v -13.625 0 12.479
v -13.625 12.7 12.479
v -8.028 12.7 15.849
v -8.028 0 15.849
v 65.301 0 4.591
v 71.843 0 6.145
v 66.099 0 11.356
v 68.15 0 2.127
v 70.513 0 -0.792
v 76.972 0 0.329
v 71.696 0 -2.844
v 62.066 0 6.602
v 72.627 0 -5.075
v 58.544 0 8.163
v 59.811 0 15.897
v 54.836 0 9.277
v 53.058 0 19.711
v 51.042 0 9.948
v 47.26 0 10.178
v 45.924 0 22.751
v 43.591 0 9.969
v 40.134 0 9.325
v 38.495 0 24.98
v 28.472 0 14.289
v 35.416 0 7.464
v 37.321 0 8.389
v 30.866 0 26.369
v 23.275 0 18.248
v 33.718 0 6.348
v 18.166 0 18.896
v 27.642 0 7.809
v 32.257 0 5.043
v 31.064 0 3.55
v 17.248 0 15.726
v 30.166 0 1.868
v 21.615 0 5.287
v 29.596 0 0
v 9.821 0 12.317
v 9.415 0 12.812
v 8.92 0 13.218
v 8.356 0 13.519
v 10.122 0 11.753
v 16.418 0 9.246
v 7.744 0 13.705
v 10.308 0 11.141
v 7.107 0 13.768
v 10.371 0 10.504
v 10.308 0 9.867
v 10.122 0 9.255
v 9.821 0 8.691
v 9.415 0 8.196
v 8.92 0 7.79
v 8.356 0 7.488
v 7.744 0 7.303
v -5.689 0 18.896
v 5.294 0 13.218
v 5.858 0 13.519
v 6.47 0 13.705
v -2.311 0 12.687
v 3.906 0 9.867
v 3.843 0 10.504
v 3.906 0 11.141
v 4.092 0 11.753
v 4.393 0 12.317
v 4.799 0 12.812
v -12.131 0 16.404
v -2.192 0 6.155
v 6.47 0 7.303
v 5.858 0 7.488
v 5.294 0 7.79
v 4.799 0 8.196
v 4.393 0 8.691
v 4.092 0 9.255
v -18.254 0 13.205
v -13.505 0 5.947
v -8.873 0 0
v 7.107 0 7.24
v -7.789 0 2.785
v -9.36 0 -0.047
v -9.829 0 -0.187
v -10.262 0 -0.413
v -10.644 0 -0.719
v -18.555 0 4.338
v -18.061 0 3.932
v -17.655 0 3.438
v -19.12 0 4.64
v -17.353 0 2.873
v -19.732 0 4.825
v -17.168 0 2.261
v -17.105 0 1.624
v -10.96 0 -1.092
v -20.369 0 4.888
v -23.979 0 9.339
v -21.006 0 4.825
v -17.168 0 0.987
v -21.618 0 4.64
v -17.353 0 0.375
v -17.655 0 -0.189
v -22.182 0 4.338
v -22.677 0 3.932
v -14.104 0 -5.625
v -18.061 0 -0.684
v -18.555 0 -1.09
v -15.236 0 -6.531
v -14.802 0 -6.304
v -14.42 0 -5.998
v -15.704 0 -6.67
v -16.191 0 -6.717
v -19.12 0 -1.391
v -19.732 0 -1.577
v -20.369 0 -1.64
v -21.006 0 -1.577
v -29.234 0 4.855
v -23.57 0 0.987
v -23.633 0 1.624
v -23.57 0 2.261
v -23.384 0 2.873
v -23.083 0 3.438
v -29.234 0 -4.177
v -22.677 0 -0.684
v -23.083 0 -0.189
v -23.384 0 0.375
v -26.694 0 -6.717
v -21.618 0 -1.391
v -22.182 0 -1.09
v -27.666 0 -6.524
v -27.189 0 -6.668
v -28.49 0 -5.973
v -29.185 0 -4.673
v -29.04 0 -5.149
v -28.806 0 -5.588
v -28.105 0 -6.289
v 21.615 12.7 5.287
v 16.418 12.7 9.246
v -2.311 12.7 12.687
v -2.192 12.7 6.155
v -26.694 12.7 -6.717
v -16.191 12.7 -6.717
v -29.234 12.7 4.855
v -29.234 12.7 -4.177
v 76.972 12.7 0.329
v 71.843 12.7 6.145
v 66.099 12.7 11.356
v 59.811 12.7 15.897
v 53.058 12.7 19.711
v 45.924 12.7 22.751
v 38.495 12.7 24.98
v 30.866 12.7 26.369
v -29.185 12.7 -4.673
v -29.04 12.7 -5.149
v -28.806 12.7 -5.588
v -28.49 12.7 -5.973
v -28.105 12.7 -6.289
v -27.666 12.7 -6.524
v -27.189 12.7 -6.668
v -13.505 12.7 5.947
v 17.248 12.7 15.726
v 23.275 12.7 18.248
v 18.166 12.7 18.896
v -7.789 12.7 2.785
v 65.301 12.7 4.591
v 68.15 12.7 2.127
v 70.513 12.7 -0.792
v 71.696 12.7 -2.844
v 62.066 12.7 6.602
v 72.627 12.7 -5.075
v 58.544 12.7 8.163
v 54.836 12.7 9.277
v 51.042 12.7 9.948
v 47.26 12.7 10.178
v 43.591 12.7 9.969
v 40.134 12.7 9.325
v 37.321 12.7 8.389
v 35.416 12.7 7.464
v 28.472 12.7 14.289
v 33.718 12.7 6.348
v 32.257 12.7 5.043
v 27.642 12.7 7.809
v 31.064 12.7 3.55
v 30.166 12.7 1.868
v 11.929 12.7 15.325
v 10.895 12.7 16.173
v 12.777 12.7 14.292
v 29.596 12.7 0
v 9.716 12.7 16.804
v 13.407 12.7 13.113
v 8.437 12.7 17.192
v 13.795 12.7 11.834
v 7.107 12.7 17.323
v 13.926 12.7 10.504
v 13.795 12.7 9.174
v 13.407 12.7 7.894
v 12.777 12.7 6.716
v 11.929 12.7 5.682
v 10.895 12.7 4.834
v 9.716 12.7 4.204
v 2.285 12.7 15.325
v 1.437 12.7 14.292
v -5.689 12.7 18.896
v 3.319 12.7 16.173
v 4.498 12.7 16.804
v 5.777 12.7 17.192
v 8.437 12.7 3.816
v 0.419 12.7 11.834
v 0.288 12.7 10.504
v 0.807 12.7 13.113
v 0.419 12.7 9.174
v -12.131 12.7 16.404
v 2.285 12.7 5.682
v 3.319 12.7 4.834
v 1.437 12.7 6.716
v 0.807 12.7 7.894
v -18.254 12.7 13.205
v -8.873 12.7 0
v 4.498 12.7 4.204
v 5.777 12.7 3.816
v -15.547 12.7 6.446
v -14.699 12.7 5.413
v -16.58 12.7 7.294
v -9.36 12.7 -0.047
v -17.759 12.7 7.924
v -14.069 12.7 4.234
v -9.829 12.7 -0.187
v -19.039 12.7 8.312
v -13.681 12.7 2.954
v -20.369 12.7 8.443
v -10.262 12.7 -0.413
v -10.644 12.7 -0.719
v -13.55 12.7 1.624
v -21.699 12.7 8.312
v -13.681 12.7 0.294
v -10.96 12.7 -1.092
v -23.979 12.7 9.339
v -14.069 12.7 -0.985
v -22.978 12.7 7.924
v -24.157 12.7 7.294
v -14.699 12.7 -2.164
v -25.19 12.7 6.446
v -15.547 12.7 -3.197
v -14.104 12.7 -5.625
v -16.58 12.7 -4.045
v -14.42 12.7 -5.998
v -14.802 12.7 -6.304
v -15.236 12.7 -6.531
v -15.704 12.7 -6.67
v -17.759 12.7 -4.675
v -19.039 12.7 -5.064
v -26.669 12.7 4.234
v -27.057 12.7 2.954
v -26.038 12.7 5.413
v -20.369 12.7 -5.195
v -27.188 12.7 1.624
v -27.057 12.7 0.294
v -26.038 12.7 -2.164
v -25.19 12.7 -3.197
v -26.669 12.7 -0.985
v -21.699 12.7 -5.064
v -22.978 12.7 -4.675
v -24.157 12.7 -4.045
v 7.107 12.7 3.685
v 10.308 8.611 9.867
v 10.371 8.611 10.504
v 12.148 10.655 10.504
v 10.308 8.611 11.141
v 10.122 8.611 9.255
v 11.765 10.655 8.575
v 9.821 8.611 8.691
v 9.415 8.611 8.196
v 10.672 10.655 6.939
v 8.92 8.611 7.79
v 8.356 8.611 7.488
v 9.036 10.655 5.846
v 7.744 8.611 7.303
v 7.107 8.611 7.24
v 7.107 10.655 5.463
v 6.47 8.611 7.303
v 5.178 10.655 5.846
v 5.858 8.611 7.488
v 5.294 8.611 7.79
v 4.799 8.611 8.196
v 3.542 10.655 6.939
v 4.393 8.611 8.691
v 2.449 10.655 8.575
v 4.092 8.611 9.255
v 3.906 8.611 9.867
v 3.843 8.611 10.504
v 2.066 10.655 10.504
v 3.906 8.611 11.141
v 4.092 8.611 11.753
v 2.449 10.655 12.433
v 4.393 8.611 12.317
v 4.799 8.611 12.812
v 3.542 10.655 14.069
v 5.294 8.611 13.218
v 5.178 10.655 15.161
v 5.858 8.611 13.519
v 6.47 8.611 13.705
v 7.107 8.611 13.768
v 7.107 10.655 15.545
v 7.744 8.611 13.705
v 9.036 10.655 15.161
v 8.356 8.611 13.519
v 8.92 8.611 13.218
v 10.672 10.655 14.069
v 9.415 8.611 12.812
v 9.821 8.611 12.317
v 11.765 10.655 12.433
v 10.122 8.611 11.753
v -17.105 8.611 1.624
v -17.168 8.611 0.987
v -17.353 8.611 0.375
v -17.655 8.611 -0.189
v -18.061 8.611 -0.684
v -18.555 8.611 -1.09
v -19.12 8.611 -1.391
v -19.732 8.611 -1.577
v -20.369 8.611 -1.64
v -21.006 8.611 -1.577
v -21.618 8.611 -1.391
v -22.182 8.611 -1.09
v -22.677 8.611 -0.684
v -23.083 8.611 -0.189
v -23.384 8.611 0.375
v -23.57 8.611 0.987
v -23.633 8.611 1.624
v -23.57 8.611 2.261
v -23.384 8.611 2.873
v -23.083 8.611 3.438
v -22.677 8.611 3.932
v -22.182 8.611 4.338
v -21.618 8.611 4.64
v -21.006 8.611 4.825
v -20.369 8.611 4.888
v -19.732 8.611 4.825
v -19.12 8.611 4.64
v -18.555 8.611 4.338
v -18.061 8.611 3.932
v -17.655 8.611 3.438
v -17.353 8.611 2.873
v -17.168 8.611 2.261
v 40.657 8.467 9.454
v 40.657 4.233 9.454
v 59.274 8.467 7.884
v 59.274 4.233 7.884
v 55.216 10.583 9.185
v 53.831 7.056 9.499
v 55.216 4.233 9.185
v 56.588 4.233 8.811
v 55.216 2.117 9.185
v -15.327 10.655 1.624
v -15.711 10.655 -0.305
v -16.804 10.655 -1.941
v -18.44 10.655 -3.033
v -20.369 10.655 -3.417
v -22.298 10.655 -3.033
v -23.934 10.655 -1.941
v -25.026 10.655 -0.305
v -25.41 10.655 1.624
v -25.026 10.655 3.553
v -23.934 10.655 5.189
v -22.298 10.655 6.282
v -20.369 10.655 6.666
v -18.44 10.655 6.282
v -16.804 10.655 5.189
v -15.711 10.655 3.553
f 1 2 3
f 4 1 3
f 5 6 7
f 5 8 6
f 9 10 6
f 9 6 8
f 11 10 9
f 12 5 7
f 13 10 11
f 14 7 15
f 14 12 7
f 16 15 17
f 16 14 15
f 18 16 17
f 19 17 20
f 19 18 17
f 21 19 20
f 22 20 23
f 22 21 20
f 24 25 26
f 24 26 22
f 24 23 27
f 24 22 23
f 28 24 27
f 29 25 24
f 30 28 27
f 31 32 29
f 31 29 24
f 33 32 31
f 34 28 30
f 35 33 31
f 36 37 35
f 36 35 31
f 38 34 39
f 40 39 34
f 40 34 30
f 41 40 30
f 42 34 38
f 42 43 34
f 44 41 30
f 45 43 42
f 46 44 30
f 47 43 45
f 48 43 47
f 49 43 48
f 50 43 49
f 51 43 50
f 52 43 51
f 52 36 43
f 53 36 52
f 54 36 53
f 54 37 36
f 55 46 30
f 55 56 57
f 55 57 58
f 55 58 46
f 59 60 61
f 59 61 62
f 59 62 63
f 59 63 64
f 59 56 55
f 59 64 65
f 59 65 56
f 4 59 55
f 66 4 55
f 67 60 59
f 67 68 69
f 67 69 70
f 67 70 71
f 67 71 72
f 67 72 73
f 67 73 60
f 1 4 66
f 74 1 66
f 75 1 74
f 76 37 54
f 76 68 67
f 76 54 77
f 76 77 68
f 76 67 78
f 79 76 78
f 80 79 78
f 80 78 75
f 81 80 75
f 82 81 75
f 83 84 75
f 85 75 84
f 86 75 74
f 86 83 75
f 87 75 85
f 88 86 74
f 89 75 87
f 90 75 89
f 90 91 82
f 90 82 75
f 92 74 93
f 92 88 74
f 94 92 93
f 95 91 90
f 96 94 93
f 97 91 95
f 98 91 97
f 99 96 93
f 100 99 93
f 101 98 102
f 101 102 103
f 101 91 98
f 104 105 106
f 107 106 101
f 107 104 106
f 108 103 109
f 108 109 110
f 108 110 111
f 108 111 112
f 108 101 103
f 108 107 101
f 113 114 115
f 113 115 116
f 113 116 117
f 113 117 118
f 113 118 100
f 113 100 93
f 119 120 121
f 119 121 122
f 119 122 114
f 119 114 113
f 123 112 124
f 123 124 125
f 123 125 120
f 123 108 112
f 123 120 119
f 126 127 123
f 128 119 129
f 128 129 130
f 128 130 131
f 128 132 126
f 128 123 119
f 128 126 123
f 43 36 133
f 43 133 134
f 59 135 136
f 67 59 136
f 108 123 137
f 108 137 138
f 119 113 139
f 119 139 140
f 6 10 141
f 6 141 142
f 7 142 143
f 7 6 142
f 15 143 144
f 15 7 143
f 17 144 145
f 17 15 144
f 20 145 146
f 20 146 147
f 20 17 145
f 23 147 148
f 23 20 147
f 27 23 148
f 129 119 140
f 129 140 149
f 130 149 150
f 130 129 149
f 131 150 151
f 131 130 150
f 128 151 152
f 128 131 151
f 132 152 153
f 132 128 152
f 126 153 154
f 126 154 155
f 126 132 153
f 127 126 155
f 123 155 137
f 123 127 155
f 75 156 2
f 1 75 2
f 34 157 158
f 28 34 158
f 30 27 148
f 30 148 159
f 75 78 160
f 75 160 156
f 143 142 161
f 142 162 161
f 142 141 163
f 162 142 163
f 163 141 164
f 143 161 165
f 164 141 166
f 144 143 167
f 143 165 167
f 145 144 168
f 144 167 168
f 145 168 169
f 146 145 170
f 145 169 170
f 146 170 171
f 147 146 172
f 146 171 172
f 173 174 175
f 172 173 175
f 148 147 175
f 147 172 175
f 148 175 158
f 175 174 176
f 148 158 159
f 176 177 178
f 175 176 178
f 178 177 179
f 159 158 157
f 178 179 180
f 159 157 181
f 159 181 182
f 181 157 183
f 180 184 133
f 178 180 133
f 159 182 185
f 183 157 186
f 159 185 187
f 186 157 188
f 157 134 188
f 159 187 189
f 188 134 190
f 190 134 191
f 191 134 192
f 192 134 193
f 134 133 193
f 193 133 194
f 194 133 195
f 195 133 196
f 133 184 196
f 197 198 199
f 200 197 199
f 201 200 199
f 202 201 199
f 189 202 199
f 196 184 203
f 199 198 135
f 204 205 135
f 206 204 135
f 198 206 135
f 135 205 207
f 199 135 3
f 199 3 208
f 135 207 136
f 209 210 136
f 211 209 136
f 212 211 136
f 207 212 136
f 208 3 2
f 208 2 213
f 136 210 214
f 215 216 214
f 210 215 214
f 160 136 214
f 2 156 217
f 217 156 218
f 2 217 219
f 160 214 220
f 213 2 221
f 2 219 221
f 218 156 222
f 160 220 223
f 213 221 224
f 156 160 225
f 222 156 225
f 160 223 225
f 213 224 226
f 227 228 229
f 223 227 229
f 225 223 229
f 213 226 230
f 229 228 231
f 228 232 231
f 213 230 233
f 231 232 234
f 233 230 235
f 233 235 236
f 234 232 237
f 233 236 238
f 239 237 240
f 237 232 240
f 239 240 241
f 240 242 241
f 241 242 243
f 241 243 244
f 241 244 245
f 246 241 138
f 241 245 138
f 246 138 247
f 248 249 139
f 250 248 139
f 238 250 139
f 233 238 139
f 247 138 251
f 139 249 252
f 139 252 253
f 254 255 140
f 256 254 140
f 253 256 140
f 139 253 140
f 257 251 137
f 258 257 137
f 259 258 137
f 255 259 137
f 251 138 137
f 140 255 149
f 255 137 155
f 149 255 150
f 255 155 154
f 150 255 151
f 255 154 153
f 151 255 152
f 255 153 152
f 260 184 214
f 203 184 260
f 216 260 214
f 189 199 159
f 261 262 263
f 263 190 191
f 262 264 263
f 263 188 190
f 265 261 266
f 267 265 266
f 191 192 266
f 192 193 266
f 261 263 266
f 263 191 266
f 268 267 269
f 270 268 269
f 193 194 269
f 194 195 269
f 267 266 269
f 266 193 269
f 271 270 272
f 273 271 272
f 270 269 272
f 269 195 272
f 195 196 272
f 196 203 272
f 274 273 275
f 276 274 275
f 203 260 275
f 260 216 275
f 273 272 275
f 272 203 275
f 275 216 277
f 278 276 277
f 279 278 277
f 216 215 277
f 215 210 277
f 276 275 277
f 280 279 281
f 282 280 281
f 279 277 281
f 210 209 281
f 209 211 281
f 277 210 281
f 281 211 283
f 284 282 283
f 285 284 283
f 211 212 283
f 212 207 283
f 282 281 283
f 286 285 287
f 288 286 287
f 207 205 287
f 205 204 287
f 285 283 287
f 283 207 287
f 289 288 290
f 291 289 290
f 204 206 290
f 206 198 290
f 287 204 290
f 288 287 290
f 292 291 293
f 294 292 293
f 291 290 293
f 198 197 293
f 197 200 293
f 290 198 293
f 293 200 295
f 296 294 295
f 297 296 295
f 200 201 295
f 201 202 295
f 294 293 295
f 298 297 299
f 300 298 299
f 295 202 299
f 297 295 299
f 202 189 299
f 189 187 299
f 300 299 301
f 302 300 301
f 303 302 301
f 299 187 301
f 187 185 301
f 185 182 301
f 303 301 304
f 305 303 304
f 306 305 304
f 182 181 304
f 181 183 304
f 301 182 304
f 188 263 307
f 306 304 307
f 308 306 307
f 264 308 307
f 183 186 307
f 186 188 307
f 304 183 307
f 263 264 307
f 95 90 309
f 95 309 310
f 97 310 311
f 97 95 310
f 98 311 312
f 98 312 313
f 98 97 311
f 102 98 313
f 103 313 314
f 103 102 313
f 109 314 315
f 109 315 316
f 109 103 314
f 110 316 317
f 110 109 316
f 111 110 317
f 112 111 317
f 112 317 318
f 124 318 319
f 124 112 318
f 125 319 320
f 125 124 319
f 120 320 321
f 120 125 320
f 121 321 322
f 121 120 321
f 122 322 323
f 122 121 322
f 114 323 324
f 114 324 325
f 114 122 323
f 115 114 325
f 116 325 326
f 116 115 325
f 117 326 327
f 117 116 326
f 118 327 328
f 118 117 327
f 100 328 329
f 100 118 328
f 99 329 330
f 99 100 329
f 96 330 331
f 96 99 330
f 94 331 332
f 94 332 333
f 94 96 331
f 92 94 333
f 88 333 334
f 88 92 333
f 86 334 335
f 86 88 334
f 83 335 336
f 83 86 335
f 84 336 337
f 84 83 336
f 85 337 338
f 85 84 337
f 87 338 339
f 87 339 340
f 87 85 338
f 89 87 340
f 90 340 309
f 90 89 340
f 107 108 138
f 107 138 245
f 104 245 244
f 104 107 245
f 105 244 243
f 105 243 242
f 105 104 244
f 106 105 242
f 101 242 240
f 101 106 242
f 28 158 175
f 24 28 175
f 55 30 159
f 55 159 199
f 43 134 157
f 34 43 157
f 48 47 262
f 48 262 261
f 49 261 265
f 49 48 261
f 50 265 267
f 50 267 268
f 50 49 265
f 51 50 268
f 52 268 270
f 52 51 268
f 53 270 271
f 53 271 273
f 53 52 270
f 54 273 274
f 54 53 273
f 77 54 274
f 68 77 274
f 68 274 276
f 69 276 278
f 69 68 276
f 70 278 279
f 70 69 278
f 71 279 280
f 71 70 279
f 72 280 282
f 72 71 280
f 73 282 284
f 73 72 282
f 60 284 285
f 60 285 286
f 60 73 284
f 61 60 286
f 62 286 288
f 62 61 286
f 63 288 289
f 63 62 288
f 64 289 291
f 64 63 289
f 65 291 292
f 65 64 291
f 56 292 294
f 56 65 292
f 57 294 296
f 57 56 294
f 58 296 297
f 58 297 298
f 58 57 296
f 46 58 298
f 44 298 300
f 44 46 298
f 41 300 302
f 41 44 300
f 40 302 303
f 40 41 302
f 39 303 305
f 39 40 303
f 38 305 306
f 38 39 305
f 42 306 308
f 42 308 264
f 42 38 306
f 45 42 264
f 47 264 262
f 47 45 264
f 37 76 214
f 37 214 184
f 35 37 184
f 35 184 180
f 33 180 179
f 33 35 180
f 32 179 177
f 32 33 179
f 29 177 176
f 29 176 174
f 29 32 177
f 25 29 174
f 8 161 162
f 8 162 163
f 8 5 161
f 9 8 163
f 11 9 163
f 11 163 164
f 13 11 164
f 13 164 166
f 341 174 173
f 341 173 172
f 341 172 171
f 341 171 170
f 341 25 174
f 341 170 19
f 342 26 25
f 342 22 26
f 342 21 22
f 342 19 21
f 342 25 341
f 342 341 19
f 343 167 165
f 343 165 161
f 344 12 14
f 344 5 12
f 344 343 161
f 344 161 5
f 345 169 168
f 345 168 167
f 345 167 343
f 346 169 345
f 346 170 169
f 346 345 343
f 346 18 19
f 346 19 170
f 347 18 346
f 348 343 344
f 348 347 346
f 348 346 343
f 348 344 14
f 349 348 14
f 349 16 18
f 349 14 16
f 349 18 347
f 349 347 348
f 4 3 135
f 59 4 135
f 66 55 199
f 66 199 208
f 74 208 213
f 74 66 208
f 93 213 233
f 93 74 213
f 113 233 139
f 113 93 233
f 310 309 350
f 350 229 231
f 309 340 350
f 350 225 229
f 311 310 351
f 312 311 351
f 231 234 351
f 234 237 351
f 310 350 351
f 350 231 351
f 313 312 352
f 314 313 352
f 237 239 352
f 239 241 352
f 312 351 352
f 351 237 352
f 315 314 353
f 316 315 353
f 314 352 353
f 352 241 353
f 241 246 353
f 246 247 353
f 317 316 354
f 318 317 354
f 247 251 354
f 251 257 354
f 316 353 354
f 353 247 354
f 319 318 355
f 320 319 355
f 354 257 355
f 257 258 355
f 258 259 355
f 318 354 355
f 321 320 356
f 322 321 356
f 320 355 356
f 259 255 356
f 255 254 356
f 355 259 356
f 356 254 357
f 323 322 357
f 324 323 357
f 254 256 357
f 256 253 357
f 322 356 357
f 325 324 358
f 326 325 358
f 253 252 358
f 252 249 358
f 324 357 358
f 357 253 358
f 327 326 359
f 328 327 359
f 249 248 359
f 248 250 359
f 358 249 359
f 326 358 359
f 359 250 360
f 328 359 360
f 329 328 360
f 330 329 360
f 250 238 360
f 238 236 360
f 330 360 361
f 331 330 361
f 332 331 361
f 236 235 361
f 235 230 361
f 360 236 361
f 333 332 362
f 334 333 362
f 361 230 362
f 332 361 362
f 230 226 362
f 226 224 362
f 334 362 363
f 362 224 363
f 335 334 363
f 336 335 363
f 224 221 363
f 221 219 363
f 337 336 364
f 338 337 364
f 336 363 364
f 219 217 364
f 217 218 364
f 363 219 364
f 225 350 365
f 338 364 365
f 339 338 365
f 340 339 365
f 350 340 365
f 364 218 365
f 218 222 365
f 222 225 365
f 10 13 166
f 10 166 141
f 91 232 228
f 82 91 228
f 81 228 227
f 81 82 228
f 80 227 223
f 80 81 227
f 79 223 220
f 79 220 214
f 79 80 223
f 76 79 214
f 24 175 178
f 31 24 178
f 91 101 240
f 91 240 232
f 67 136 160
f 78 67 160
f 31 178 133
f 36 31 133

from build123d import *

# Parameters (mm, degrees)
SKETCH1_R             = 3.2639
BOSS_EXTRUDE1_DEPTH   = 12.7
CHAMFER1_SIZE         = 4.0894
CHAMFER1_SIZE2        = 3.554861186
CHAMFER1_PART_2_SIZE  = 4.0894
CHAMFER1_PART_2_SIZE2 = 3.554861186
CUT_EXTRUDE1_DEPTH    = 13.7000001


with BuildPart() as part:
    # Sketch1 → Boss-Extrude1 (new body)
    with BuildSketch(Plane(origin=(0, 0, 0), x_dir=(1, 0, 0), z_dir=(0, 1, 0))):
        with BuildLine():
            Line((-8.873253367, 0), (29.595519551, 0))
            add(Edge.make_bspline(
                [(29.595519551, 0), (32.608022391, -14.845023466), (66.17675893, -13.698872415), (72.627485997, 5.074574194)],
                knots=[0, 0, 0, 0, 1, 1, 1, 1], degree=3))
            Line((72.627485997, 5.074574194), (76.972410672, -0.328799158))
            ThreePointArc((76.972410672, -0.328799158), (56.487992256, -17.897771795), (30.865519551, -26.369435729))
            Line((30.865519551, -26.369435729), (18.165519551, -18.896027316))
            Line((18.165519551, -18.896027316), (-5.688817186, -18.896027316))
            ThreePointArc((-5.688817186, -18.896027316), (-18.253794481, -13.20459823), (-29.23375861, -4.855262498))
            Line((-29.23375861, -4.855262498), (-29.23375861, 4.177286104))
            ThreePointArc((-29.23375861, 4.177286104), (-28.489809834, 5.973337328), (-26.69375861, 6.717286104))
            Line((-26.69375861, 6.717286104), (-16.191261416, 6.717286104))
            ThreePointArc((-16.191261416, 6.717286104), (-15.013419953, 6.427683732), (-14.10416564, 5.624915621))
            Line((-14.10416564, 5.624915621), (-10.960349143, 1.092370482))
            ThreePointArc((-10.960349143, 1.092370482), (-10.05109483, 0.289602371), (-8.873253367, 0))
        make_face()
        with Locations((-20.368787798, -1.624222444)):
            Circle(SKETCH1_R, mode=Mode.SUBTRACT)
        with Locations((-7.908365266, -9.317144856)):
            Circle(SKETCH1_R, mode=Mode.SUBTRACT)
        with Locations((7.107001098, -10.503835127)):
            Circle(SKETCH1_R, mode=Mode.SUBTRACT)
        with Locations((22.444824189, -11.767482364)):
            Circle(SKETCH1_R, mode=Mode.SUBTRACT)
    extrude(amount=BOSS_EXTRUDE1_DEPTH)

    # Chamfer1
    chamfer1_edges = [part.edges().sort_by_distance(p)[0] for p in [
        (-23.632687798, 12.7, 1.624222444),
    ]]
    chamfer1_side = [part.faces().sort_by_distance(p)[0] for p in [
        (-23.632687798, 6.35, 1.624222444),
    ]]
    chamfer(chamfer1_edges, length=CHAMFER1_SIZE, length2=CHAMFER1_SIZE2, reference=chamfer1_side[0])

    # Chamfer1 part 2
    chamfer1_part_2_edges = [part.edges().sort_by_distance(p)[0] for p in [
        (3.843101098, 12.7, 10.503835127),
    ]]
    chamfer1_part_2_side = [part.faces().sort_by_distance(p)[0] for p in [
        (3.843101098, 6.35, 10.503835127),
    ]]
    chamfer(chamfer1_part_2_edges, length=CHAMFER1_PART_2_SIZE, length2=CHAMFER1_PART_2_SIZE2, reference=chamfer1_part_2_side[0])

    # Sketch2 → Cut-Extrude1 (cut, through all)
    with BuildSketch(Plane(origin=(0, 12.7, 0), x_dir=(1, 0, 0), z_dir=(0, 1, 0))):
        Polygon((-2.191584648, -6.154850089), (-7.78860256, -2.78512023), (-13.505383178, -5.947414997), (-13.625145885, -12.479439623), (-8.028127973, -15.849169483), (-2.311347355, -12.686874716), align=None)
        Polygon((28.471794253, -14.28885514), (27.641882098, -7.808659569), (21.614912034, -5.287286792), (16.417854125, -9.246109587), (17.247766281, -15.726305159), (23.274736345, -18.247677935), align=None)
    extrude(amount=-CUT_EXTRUDE1_DEPTH, mode=Mode.SUBTRACT)


solid = part.part
